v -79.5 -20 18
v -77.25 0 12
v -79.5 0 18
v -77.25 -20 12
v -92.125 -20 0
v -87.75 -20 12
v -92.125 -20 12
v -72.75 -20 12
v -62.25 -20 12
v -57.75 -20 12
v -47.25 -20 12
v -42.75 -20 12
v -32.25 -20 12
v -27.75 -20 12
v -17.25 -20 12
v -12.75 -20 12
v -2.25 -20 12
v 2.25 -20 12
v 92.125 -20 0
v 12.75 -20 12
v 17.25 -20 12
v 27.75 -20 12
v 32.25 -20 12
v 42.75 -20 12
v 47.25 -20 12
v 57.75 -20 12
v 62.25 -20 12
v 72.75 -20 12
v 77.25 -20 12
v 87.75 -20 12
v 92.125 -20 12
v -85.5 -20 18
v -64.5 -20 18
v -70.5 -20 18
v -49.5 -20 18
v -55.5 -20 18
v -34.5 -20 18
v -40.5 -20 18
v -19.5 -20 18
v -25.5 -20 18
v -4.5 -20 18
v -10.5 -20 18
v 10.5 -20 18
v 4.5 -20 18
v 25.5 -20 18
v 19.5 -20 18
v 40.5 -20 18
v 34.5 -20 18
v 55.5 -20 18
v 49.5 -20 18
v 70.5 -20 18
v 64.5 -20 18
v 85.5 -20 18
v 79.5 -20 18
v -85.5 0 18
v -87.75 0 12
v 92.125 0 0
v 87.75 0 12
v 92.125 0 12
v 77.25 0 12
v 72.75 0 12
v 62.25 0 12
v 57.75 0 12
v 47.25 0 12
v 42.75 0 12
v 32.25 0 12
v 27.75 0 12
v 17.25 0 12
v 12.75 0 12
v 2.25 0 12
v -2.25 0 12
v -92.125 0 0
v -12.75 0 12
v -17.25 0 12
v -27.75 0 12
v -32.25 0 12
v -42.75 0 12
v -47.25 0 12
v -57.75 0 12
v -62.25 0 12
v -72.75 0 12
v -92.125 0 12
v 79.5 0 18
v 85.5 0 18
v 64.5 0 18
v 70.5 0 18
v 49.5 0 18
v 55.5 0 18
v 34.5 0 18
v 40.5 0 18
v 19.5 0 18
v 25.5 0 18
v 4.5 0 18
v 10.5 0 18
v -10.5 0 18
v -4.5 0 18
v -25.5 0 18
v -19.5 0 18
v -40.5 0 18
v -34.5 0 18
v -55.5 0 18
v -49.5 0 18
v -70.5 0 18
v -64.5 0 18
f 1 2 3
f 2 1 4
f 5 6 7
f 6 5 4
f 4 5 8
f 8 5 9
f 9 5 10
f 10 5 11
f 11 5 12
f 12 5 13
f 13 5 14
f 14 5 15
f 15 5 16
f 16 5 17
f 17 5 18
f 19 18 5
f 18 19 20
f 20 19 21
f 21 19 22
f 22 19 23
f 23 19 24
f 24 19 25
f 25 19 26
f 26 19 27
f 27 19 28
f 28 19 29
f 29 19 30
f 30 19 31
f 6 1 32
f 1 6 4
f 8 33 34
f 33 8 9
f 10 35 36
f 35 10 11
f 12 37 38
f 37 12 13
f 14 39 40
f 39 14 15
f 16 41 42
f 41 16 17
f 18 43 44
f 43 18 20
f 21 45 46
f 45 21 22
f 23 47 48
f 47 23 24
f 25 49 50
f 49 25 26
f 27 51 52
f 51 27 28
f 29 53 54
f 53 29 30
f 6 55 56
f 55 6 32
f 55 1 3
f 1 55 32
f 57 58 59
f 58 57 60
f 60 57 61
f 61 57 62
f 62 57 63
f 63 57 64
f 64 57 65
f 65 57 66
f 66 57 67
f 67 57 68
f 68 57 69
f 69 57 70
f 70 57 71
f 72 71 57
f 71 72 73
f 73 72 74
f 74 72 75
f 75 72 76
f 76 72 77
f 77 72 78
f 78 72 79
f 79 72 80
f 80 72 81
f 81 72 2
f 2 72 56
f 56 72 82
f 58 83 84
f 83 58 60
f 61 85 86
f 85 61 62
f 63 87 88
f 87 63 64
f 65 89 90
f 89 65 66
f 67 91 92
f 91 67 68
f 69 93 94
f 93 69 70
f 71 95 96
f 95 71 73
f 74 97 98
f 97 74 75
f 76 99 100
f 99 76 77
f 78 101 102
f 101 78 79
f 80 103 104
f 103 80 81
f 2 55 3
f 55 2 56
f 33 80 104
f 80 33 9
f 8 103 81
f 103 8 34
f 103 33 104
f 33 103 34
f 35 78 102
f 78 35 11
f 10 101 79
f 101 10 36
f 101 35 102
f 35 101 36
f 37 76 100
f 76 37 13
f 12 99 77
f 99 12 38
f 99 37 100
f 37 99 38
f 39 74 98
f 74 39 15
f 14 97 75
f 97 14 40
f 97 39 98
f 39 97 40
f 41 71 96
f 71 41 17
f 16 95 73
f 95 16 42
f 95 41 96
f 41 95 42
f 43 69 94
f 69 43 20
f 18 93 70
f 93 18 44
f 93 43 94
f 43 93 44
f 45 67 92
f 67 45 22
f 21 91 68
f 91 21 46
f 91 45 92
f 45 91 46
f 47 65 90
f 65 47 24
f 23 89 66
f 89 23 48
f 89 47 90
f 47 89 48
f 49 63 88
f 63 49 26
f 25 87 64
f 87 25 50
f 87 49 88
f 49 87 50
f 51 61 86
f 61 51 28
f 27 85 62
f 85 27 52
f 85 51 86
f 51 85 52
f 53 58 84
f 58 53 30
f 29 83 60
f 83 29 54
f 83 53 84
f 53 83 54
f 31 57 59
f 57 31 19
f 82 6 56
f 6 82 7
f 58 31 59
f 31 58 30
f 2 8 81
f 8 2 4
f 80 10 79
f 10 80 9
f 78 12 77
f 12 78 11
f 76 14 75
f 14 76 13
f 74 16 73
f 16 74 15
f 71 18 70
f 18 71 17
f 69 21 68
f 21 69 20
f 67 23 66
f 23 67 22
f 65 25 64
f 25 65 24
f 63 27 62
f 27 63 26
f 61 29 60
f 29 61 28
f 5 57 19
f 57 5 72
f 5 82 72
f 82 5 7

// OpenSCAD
$fn = 32;

// ----------------------------------------------------------------------
// Toothed rack, 12 teeth
// 15 mm pitch, 6 mm teeth
// ----------------------------------------------------------------------

// --- parameters (mm) ---
bar_w = 20;      // bar width (Y)
bar_h = 12;      // bar height (Z)
teeth = 12;      // number of teeth
pitch = 15;      // tooth pitch
tooth_h = 6;     // tooth height above the bar
root_w = 11.25;  // tooth width at the root
crest_w = 6;     // tooth width at the crest

// --- derived feature positions (mm) ---
span = (teeth - 1) * pitch;  // = 165   distance between the outer teeth
bar_l = span + root_w + 8;   // = 184.25   bar length: teeth plus 4 mm at each end
tooth_x = -span / 2;         // = -82.5   X of the first tooth
height = bar_h + tooth_h;    // = 18   overall height
feature_centers = [
  [tooth_x + 0 * pitch, -bar_w / 2],
  [tooth_x + 1 * pitch, -bar_w / 2],
  [tooth_x + 2 * pitch, -bar_w / 2],
  [tooth_x + 3 * pitch, -bar_w / 2],
  [tooth_x + 4 * pitch, -bar_w / 2],
  [tooth_x + 5 * pitch, -bar_w / 2],
  [tooth_x + 6 * pitch, -bar_w / 2],
  [tooth_x + 7 * pitch, -bar_w / 2],
  [tooth_x + 8 * pitch, -bar_w / 2],
  [tooth_x + 9 * pitch, -bar_w / 2],
  [tooth_x + 10 * pitch, -bar_w / 2],
  [tooth_x + 11 * pitch, -bar_w / 2]
];   // tooth centre line, drives the tooth loop

// bar with a rack of teeth, one extruded trapezoium per centre
module rack_tooth() {
  linear_extrude(height = bar_w)
    polygon(points = [
      [0, 0],
      [root_w, 0],
      [root_w / 2 + crest_w / 2, tooth_h + 1],
      [root_w / 2 - crest_w / 2, tooth_h + 1]
    ]);
}

union() {
  translate([-bar_l / 2, -bar_w, 0]) cube([bar_l, bar_w, bar_h]);
  for (centre = feature_centers)
    translate([centre[0] - root_w / 2, 0, bar_h - 1]) rotate([90, 0, 0]) rack_tooth();
}
